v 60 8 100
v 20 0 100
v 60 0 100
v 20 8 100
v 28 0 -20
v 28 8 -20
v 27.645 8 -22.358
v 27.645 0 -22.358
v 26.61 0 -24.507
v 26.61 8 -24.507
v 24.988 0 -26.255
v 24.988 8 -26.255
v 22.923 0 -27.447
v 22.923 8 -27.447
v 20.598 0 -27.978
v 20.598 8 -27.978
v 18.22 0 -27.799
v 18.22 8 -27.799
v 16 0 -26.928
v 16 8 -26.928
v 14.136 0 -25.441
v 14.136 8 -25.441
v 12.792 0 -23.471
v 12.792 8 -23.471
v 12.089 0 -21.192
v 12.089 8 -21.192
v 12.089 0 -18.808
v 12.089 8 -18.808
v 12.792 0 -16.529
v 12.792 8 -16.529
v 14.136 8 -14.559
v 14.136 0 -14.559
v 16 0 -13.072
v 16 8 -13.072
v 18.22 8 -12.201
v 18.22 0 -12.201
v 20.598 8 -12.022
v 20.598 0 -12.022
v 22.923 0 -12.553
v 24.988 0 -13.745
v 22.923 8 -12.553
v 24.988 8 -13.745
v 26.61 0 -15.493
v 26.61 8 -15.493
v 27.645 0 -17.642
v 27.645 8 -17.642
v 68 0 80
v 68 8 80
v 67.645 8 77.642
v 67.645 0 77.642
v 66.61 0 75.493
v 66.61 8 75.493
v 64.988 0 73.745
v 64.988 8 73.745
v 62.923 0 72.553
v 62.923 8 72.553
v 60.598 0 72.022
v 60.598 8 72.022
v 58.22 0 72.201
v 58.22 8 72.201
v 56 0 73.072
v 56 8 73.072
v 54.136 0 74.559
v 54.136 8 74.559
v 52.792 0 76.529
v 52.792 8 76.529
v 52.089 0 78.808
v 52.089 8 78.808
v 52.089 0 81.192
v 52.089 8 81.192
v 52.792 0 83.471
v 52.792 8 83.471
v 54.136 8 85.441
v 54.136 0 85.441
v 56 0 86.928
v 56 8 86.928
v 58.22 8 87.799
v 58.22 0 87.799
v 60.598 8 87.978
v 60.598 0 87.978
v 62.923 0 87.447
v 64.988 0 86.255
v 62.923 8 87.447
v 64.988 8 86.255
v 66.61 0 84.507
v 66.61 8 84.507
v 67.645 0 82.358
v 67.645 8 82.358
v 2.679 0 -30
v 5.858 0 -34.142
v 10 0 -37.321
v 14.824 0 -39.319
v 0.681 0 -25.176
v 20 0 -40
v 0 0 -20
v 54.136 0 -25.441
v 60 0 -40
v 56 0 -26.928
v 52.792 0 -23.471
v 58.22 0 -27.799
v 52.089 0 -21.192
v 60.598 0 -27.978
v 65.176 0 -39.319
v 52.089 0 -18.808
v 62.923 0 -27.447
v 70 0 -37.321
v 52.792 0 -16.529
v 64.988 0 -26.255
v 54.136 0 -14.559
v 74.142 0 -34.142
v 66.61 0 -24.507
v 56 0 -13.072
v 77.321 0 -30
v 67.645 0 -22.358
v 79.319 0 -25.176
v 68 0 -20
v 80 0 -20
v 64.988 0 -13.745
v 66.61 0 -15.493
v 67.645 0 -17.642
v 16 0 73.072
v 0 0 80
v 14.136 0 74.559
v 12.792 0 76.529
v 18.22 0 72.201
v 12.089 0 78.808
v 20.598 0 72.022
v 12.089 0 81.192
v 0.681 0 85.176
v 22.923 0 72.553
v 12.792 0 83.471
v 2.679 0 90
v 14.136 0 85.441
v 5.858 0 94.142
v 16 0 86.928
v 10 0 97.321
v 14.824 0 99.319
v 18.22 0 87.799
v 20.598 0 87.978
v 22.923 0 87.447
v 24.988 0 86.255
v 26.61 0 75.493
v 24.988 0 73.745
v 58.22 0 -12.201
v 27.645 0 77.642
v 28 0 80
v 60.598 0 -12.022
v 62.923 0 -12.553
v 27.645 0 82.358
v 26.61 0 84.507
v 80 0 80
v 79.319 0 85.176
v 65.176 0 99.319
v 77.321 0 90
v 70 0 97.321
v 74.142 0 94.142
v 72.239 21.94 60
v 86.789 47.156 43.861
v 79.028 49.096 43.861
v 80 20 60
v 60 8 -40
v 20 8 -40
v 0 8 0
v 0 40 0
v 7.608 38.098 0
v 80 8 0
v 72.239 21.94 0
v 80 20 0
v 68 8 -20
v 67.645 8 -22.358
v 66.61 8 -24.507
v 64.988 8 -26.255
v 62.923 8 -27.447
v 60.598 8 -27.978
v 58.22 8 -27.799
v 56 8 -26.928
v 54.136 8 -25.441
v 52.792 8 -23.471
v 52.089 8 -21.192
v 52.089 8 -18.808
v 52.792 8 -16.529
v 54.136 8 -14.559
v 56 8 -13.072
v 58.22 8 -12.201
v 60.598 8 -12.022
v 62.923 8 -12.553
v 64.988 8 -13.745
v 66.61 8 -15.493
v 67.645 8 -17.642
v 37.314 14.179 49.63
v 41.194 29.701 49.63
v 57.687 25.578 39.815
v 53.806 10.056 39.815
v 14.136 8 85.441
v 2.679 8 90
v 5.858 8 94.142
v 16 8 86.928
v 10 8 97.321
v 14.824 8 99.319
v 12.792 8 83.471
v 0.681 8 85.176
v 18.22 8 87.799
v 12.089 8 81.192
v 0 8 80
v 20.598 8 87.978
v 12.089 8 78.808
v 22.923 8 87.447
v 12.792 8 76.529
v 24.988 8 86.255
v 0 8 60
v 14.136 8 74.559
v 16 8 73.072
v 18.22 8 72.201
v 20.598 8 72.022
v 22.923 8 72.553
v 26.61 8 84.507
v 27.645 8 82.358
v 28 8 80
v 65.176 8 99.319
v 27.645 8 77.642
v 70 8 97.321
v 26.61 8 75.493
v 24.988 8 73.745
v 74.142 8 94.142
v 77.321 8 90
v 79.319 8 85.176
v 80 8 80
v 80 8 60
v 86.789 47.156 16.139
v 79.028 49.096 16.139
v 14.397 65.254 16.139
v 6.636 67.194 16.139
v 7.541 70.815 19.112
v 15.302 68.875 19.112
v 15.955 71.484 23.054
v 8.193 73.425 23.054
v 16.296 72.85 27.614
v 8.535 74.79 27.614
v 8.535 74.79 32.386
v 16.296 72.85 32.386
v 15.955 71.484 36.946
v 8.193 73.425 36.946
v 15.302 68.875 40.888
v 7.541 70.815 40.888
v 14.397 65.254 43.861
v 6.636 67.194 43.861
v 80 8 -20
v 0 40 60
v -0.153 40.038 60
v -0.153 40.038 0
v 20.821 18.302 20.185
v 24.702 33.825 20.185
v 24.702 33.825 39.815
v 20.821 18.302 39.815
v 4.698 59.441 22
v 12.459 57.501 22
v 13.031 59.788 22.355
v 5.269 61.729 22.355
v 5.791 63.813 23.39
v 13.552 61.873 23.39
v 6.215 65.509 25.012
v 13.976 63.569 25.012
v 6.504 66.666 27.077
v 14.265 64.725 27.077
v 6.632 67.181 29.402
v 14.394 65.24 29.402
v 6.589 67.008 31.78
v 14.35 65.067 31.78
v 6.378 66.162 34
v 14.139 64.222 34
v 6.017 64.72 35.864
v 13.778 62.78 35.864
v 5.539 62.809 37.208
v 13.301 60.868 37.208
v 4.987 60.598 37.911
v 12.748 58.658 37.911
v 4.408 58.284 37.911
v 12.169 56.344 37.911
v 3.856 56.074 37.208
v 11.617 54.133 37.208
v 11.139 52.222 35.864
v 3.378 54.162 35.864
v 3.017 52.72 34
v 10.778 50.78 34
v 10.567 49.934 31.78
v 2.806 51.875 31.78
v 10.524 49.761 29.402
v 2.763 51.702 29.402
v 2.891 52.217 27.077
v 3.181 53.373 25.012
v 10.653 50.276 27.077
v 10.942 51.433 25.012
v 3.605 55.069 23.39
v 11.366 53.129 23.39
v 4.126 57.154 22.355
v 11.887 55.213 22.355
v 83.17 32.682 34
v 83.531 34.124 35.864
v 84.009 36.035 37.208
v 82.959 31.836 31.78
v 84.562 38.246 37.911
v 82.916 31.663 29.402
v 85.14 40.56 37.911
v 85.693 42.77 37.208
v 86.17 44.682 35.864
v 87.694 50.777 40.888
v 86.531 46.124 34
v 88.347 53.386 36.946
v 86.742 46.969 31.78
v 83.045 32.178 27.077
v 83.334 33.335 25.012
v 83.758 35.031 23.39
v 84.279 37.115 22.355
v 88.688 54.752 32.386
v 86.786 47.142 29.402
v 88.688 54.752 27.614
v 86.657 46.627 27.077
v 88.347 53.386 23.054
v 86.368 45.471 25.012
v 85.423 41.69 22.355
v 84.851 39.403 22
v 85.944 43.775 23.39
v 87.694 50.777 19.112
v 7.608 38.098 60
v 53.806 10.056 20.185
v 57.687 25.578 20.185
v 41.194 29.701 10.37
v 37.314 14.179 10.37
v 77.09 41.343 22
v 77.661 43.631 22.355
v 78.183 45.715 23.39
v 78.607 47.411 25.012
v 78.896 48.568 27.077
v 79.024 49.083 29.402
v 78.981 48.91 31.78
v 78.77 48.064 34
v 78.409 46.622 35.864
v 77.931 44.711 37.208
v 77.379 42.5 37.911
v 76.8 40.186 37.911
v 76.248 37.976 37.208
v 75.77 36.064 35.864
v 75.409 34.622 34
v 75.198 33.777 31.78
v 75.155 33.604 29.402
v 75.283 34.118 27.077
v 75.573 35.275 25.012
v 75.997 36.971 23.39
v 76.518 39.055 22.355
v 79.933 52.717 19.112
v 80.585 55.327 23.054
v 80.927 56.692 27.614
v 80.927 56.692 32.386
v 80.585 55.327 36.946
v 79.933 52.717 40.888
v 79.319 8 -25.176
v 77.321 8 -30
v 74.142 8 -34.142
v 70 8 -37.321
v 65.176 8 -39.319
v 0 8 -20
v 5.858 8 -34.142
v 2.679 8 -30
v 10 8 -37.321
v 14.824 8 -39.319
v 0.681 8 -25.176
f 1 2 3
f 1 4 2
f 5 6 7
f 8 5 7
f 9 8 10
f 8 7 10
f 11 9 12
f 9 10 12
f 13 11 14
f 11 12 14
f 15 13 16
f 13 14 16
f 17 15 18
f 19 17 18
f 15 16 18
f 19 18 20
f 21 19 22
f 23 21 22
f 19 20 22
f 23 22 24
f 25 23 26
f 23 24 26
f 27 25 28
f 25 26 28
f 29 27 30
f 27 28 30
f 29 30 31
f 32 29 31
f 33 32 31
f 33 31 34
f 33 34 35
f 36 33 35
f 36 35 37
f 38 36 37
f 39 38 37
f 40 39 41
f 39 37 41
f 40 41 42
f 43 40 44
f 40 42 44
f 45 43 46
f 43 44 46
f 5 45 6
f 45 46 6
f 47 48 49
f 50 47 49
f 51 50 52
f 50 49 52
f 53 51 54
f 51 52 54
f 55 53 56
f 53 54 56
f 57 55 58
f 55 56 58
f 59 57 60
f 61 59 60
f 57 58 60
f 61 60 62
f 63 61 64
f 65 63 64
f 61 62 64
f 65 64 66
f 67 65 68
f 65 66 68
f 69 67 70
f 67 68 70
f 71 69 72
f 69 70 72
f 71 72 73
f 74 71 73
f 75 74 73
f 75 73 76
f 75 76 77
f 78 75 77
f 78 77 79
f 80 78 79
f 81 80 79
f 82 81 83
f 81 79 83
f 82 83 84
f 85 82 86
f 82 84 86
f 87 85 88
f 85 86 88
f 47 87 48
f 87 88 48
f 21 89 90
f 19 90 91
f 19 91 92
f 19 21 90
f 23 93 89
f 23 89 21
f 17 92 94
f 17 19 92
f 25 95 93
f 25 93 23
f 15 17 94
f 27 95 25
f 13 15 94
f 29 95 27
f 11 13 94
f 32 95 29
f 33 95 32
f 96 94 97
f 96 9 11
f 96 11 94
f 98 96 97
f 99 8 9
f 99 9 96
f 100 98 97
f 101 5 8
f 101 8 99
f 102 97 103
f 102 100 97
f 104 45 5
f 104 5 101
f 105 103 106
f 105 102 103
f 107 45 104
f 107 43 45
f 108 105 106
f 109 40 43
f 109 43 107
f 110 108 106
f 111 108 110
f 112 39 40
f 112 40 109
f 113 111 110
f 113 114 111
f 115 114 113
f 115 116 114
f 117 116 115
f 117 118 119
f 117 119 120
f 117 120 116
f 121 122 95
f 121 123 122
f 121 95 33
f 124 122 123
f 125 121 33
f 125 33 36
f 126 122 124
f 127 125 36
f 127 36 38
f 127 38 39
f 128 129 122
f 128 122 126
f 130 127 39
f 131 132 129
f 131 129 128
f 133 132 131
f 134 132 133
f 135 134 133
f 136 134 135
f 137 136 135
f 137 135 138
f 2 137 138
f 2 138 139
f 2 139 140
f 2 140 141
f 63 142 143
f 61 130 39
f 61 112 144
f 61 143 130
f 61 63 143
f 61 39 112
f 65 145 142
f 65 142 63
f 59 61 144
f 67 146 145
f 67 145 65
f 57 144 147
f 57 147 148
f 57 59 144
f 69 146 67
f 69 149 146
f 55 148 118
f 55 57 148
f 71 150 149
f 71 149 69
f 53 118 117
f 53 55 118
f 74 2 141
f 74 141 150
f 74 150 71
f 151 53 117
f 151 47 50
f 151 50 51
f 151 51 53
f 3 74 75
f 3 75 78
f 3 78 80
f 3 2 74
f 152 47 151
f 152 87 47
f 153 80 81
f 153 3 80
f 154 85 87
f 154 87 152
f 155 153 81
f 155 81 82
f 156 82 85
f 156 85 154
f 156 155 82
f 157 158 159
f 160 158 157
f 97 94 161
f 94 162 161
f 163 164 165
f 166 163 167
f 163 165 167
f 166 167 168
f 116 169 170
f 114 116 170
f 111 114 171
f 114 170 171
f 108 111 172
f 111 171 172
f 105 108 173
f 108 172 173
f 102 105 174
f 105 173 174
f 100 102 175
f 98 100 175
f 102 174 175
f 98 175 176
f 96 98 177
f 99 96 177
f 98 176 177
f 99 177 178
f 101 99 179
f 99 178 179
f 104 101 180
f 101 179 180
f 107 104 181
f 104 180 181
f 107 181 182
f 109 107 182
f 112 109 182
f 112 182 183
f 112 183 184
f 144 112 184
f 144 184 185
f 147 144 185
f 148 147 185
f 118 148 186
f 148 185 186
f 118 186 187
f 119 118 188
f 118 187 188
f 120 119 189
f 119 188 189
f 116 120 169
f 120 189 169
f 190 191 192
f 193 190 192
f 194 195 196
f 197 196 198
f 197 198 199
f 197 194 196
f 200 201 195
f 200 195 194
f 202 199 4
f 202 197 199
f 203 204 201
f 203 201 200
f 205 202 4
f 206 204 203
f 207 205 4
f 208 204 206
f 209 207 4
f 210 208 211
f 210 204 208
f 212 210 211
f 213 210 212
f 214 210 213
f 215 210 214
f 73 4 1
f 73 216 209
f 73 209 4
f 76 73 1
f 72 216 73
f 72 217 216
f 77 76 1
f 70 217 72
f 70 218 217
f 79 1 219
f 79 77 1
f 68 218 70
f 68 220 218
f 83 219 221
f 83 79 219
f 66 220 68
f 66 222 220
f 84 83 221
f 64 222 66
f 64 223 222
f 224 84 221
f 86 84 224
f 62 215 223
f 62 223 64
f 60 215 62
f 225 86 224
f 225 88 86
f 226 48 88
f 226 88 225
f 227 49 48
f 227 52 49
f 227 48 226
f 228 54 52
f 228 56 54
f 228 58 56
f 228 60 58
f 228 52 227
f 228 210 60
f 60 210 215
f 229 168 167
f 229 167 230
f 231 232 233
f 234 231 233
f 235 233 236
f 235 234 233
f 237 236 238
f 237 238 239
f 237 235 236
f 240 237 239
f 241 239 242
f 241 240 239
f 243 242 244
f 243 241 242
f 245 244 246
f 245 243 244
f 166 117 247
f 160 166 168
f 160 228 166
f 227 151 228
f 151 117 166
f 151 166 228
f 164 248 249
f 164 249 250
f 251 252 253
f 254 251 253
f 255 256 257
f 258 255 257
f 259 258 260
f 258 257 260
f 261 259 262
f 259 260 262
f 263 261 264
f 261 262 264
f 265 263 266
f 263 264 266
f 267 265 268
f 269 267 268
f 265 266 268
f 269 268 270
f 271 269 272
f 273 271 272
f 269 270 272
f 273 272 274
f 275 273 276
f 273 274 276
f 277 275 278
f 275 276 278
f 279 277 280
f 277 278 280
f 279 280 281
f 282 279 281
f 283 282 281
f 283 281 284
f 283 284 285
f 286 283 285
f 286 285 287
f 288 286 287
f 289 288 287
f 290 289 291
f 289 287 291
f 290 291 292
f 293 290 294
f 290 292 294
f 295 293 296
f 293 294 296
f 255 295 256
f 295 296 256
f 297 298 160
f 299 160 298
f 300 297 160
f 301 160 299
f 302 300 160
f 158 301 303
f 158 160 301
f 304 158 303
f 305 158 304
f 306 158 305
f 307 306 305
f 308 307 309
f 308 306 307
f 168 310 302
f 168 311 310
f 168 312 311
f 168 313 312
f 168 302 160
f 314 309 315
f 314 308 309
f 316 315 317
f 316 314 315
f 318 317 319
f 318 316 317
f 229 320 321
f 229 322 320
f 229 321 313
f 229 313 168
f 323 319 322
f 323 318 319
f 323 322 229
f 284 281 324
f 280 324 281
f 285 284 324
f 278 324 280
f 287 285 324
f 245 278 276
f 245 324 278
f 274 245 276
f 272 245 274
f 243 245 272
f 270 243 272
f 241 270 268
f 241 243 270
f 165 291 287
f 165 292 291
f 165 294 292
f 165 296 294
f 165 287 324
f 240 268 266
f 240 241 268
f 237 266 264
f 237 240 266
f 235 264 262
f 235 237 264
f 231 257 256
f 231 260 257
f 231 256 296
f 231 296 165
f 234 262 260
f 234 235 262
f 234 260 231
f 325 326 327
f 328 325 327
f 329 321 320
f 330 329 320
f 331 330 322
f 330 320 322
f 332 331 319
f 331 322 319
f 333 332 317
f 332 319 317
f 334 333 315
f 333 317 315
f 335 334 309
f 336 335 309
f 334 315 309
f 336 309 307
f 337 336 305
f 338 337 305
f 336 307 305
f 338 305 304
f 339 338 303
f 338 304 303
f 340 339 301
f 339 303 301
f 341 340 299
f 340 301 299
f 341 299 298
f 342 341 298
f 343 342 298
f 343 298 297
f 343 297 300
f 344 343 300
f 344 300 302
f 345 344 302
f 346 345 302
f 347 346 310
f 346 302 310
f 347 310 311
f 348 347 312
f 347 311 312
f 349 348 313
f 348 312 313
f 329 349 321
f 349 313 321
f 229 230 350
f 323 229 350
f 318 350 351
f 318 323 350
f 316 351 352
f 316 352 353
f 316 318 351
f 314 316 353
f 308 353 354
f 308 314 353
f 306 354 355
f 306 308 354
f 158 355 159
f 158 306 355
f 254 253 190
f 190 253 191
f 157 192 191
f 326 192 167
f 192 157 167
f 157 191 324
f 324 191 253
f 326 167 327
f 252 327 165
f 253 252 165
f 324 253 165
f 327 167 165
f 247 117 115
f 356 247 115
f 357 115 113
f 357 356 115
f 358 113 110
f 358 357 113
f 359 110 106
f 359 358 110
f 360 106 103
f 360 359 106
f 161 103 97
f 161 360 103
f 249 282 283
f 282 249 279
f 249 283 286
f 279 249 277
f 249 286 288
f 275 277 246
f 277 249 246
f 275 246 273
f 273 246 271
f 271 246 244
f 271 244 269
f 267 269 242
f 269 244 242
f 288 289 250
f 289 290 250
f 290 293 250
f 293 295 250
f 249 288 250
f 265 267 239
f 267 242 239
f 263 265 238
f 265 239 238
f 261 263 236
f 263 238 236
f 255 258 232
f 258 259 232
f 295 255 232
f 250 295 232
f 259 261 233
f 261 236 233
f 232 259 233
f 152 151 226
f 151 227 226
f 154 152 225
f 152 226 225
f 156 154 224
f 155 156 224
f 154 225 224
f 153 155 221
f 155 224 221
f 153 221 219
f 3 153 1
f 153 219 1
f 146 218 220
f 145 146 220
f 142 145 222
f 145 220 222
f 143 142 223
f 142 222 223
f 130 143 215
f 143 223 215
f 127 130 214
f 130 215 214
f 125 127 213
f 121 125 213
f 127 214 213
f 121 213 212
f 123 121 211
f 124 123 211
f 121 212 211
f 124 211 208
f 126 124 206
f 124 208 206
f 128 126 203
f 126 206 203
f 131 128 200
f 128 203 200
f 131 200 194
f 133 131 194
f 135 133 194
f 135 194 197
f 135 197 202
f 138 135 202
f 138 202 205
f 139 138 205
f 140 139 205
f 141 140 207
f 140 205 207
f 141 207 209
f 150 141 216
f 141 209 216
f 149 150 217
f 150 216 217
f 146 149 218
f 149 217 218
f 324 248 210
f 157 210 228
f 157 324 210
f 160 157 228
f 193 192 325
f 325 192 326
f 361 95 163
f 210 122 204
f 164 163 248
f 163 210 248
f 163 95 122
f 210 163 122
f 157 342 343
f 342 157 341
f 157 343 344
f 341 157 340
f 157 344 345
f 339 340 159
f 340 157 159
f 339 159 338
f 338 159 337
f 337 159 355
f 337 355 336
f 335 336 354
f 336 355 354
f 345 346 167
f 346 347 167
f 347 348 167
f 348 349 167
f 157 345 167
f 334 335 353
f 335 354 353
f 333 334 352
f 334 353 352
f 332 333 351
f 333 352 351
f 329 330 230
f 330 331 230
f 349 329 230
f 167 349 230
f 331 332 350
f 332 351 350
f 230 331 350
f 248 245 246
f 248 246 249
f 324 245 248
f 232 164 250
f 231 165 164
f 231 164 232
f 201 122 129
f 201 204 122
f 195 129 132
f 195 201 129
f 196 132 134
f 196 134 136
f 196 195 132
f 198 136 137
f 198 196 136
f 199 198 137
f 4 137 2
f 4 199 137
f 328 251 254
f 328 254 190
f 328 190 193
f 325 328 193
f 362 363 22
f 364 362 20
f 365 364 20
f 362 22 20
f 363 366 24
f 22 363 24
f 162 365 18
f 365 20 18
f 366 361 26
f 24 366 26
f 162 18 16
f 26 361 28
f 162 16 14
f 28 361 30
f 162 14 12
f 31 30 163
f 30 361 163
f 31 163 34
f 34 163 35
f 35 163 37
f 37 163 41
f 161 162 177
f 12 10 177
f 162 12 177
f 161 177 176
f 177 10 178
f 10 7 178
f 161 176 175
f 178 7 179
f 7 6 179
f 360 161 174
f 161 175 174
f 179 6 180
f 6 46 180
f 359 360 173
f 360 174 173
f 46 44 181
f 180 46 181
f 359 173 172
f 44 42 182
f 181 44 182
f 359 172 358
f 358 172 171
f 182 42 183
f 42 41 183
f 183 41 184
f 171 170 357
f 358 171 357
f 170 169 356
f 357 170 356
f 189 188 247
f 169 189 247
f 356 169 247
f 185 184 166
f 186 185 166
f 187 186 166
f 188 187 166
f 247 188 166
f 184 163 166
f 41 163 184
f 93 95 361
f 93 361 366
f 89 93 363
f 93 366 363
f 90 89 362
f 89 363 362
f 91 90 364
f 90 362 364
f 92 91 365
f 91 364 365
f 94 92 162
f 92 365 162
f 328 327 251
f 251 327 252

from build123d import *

# Parameters (mm, degrees)
SALIENTE_EXTRUIR1_DEPTH = 60
CROQUIS2_W              = 80
CROQUIS2_H              = 8
SALIENTE_EXTRUIR2_DEPTH = 40
CROQUIS3_R              = 8
SALIENTE_EXTRUIR3_DEPTH = 8
MATRIZL1_COUNT          = 2
MATRIZL1_PITCH          = 74.62
CROQUIS5_R              = 8
CORTAR_EXTRUIR1_DEPTH   = 8
REDONDEO2_R             = 20
CORTAR_EXTRUIR2_DEPTH   = 16


with BuildPart() as part:
    # Croquis1 → Saliente-Extruir1 (new body)
    with BuildSketch(Plane.XY):
        Polygon((0, 0), (80, 0), (80, 20), (0, 40), align=None)
    extrude(amount=SALIENTE_EXTRUIR1_DEPTH)

    # Croquis2 → Saliente-Extruir2 (add)
    with BuildSketch(Plane.XY.offset(60)):
        with Locations((40, 4)):
            Rectangle(CROQUIS2_W, CROQUIS2_H)
    saliente_extruir2 = extrude(amount=SALIENTE_EXTRUIR2_DEPTH)

    # Simetría1: Saliente-Extruir2 across plane
    add(saliente_extruir2.mirror(Plane(origin=(0, 0, 30), x_dir=(1, 0, 0), z_dir=(0, 0, -1))))

    # Croquis3 → Saliente-Extruir3 (add)
    with BuildSketch(Plane(origin=(70.588235294, -17.647058824, 0), x_dir=(0, 0, -1), z_dir=(0.9701425, -0.242535625, 0))):
        with BuildLine():
            Line((-43.861166484, 66.797449732), (-60, 38.805700006))
            Line((-60, 38.805700006), (0, 38.805700006))
            Line((0, 38.805700006), (-16.138833516, 66.797449732))
            ThreePointArc((-16.138833516, 66.797449732), (-30, 74.805700006), (-43.861166484, 66.797449732))
        make_face()
        with Locations((-30, 58.805700006)):
            Circle(CROQUIS3_R, mode=Mode.SUBTRACT)
    saliente_extruir3 = extrude(amount=-SALIENTE_EXTRUIR3_DEPTH)

    # MatrizL1: Saliente-Extruir3 ×2
    with Locations(*[Vector(-0.9701425, 0.242535625, 0) * (i * MATRIZL1_PITCH) for i in range(1, MATRIZL1_COUNT)]):
        add(saliente_extruir3)

    # Croquis5 → Cortar-Extruir1 (cut)
    with BuildSketch(Plane(origin=(0, 8, 0), x_dir=(1, 0, 0), z_dir=(0, 1, 0))):
        with Locations((20, 20)):
            Circle(CROQUIS5_R)
        with Locations((60, 20)):
            Circle(CROQUIS5_R)
        with Locations((60, -80)):
            Circle(CROQUIS5_R)
        with Locations((20, -80)):
            Circle(CROQUIS5_R)
    extrude(amount=-CORTAR_EXTRUIR1_DEPTH, mode=Mode.SUBTRACT)

    # Redondeo2
    redondeo2_edges = [part.edges().sort_by_distance(p)[0] for p in [
        (0, 4, 100),
        (80, 4, 100),
        (0, 4, -40),
        (80, 4, -40),
    ]]
    fillet(redondeo2_edges, radius=REDONDEO2_R)

    # Croquis6 → Cortar-Extruir2 (cut)
    with BuildSketch(Plane(origin=(9.411764706, 37.647058824, 0), x_dir=(0.9701425, -0.242535625, 0), z_dir=(0.242535625, 0.9701425, 0))):
        Polygon((32.760687511, -10.370090848), (15.760687511, -20.185045424), (15.760687511, -39.814954576), (32.760687511, -49.629909152), (49.760687511, -39.814954576), (49.760687511, -20.185045424), align=None)
    extrude(amount=-CORTAR_EXTRUIR2_DEPTH, mode=Mode.SUBTRACT)


solid = part.part
